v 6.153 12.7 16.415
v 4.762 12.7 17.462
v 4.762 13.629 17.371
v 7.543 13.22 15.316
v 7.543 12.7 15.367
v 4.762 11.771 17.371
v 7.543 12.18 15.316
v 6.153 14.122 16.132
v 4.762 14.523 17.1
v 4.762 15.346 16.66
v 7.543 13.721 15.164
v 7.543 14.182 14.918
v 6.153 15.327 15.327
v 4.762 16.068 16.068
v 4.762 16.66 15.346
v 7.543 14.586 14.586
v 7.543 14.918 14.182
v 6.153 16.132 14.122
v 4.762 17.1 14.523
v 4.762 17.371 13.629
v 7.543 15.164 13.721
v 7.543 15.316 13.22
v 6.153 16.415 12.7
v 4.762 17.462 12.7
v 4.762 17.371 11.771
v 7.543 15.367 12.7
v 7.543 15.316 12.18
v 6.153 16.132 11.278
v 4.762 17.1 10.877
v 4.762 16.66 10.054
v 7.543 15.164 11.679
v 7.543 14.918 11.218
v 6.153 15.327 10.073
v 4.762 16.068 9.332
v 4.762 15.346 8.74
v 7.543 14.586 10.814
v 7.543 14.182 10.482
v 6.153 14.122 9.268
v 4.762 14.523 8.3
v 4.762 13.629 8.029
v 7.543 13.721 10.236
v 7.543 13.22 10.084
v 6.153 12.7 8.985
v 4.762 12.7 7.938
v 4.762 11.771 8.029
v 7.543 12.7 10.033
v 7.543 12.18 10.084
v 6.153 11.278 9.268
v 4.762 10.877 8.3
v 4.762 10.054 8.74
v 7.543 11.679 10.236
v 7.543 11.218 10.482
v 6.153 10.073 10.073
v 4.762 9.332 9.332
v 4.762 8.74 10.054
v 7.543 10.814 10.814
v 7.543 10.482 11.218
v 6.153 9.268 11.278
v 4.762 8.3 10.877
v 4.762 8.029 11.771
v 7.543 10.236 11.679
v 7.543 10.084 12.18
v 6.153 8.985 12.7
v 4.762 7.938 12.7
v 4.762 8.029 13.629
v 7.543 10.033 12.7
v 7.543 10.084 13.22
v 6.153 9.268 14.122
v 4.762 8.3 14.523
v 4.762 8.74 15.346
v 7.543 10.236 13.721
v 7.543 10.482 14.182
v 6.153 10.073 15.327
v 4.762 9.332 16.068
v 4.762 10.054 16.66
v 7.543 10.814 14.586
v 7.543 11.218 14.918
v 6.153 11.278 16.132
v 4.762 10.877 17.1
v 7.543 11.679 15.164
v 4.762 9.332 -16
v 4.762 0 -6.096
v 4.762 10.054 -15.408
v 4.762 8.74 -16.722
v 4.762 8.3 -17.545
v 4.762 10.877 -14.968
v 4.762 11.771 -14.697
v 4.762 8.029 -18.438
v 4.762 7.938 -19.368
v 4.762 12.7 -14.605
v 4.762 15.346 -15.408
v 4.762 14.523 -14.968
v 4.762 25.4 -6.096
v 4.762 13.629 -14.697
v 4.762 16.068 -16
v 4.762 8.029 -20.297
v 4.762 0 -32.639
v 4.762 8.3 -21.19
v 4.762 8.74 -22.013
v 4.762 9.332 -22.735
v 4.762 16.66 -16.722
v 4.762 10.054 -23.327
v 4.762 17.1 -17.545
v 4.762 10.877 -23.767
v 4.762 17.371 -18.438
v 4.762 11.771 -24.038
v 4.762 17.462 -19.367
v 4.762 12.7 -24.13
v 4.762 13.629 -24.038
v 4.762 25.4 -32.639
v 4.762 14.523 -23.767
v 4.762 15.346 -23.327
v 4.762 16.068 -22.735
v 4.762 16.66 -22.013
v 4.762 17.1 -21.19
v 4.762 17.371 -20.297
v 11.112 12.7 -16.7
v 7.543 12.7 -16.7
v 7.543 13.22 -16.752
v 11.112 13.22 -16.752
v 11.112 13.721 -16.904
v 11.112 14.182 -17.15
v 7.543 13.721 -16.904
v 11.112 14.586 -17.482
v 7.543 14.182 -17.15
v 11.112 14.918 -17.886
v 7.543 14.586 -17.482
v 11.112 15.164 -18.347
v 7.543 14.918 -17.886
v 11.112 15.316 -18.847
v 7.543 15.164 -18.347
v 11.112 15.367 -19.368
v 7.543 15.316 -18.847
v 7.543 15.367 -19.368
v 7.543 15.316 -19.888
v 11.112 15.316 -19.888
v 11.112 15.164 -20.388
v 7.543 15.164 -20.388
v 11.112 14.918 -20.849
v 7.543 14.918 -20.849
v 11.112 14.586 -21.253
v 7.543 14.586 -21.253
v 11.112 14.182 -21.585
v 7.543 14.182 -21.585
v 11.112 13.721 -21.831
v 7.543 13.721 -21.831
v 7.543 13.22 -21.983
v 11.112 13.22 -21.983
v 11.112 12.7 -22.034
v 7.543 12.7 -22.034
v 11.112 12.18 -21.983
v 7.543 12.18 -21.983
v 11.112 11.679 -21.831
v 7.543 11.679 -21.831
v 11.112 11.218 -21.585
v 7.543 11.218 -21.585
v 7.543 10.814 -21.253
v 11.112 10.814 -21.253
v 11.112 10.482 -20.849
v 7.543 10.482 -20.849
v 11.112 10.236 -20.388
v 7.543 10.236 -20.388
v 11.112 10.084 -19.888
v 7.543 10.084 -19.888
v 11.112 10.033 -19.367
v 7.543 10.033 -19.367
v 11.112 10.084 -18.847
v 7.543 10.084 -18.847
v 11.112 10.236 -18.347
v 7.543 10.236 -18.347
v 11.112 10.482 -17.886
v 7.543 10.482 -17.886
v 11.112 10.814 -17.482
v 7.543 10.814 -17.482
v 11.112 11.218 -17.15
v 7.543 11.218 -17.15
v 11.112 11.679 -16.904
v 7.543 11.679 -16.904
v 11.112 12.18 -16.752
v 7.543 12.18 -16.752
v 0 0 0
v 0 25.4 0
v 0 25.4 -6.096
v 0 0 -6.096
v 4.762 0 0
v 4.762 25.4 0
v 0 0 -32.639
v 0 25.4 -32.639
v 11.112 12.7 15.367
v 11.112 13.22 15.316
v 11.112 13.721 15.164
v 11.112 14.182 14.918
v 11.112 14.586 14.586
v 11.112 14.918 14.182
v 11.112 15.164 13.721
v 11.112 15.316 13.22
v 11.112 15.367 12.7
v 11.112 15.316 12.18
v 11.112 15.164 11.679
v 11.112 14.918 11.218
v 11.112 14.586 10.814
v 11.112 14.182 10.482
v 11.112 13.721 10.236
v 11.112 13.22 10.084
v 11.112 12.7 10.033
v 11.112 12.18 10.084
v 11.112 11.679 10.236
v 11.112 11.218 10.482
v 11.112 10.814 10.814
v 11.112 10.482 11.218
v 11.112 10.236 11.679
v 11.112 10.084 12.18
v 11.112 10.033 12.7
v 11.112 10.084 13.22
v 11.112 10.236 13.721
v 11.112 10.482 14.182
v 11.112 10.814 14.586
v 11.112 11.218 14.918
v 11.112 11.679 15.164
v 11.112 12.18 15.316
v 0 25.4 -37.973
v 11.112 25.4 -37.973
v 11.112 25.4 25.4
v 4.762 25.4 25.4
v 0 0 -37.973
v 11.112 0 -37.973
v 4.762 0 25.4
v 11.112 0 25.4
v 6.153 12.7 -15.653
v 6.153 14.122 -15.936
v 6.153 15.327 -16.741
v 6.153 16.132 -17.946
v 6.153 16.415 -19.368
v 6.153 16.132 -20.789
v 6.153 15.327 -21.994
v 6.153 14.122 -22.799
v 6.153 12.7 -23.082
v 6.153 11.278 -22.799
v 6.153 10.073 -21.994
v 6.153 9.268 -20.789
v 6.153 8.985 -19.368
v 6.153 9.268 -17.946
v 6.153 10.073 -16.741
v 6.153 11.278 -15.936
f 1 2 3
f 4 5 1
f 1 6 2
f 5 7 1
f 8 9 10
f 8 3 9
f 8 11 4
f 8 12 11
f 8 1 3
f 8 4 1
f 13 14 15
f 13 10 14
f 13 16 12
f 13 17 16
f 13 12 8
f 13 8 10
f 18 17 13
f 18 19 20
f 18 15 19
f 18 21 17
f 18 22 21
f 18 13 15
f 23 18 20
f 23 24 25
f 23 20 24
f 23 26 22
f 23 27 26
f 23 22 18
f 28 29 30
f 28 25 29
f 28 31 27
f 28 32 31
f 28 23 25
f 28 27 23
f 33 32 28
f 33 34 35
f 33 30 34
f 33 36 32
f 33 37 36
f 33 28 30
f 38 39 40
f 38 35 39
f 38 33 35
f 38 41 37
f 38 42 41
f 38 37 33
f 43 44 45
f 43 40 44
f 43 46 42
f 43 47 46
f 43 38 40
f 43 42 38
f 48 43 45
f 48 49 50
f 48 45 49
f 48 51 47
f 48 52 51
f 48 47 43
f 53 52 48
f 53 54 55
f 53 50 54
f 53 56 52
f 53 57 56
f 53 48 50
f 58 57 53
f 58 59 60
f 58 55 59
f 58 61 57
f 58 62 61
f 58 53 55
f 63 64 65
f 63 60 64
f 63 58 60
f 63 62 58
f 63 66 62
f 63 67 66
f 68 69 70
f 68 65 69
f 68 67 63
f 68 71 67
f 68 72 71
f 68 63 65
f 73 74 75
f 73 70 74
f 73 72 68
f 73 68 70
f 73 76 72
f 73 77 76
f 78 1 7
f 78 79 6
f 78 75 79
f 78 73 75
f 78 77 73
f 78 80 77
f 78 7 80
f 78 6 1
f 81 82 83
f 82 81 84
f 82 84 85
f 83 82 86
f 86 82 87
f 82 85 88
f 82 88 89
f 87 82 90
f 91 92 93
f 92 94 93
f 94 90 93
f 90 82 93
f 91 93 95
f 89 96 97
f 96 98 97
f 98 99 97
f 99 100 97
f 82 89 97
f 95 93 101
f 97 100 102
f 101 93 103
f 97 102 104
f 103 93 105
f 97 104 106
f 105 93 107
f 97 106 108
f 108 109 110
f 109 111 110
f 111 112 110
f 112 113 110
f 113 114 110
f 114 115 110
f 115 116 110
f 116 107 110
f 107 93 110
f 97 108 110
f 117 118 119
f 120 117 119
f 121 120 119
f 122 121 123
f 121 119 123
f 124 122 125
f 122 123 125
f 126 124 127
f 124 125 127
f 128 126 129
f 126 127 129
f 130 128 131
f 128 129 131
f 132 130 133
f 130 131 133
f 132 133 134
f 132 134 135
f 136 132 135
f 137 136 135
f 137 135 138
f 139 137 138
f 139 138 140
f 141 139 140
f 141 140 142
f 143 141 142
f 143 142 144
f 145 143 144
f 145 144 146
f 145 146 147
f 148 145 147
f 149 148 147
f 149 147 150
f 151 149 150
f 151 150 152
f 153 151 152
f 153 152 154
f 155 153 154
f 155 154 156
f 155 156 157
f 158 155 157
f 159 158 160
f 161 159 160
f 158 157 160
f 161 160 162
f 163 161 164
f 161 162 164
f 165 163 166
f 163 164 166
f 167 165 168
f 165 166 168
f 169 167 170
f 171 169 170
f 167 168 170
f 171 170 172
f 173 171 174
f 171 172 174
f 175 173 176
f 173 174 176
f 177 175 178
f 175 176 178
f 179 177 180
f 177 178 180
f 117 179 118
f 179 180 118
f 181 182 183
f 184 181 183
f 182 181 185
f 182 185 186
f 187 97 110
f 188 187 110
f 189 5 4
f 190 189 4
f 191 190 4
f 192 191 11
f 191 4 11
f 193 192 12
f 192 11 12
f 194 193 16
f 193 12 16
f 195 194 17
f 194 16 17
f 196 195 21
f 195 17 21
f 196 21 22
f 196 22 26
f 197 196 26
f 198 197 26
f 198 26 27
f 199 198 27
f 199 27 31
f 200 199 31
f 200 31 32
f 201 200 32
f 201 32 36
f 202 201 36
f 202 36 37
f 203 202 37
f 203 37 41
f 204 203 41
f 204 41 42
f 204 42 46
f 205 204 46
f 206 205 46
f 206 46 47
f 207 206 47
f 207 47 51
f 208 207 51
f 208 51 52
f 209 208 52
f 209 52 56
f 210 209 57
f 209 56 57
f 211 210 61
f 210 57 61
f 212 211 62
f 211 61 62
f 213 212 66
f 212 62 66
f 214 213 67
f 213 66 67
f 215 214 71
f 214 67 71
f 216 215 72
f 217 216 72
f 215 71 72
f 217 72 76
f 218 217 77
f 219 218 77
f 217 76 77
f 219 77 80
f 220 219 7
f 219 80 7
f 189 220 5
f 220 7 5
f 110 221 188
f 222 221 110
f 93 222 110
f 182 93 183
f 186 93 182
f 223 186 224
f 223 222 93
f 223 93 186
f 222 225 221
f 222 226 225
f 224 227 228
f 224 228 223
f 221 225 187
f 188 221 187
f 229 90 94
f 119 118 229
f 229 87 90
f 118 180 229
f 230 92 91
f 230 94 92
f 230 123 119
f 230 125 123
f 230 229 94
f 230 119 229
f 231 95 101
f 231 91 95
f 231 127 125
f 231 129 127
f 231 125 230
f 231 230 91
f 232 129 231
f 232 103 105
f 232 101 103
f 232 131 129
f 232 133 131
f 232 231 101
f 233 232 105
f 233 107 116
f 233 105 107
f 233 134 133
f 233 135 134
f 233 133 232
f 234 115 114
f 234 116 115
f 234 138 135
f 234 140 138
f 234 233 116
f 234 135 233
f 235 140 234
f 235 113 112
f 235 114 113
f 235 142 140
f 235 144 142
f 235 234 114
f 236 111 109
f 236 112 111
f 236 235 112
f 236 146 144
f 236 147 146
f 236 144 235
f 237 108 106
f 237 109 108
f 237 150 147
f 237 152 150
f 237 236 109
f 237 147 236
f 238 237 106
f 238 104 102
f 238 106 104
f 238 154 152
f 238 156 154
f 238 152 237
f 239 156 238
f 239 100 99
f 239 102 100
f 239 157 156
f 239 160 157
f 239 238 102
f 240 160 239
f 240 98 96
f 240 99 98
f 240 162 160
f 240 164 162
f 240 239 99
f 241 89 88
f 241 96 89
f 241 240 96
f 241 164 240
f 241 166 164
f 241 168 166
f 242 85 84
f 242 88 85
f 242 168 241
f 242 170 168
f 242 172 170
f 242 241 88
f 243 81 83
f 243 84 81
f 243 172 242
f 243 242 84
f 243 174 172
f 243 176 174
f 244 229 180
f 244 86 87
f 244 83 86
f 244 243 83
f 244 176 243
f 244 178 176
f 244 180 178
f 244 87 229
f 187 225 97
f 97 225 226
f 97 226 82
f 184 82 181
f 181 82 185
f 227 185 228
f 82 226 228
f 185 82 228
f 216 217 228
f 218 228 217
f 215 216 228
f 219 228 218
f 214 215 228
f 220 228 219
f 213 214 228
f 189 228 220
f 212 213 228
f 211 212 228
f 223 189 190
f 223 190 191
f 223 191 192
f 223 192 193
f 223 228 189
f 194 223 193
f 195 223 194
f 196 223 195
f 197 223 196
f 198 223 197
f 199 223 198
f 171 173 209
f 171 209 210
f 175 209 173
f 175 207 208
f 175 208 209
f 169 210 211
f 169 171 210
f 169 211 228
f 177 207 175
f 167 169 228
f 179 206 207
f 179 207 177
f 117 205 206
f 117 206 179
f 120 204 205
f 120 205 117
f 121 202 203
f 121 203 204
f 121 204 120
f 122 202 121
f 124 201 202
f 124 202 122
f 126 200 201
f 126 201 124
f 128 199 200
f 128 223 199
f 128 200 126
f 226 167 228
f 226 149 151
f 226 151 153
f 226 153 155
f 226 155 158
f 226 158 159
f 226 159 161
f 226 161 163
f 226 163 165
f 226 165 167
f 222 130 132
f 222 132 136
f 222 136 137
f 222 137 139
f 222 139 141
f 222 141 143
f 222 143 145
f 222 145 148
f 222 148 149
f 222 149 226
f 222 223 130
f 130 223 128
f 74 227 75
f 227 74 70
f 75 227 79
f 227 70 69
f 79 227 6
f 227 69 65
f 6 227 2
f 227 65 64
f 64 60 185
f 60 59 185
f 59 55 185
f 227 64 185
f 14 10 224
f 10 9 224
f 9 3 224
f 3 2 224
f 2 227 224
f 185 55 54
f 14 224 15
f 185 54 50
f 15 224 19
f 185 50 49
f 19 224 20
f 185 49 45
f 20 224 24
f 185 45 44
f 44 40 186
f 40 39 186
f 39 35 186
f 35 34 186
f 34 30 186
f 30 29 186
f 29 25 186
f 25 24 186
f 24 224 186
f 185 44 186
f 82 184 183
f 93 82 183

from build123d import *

# Parameters (mm, degrees)
SKETCH1_W           = 6.096
SKETCH1_H           = 25.4
BOSS_EXTRUDE1_DEPTH = 4.7625
SKETCH2_W           = 69.85
SKETCH2_H           = 25.4
BOSS_EXTRUDE2_DEPTH = 6.35
SKETCH5_W           = 5.334
SKETCH5_H           = 25.4
BOSS_EXTRUDE3_DEPTH = 4.7625
CUT_EXTRUDE3_REACH  = 8.35
SKETCH6_W           = 6.477
SKETCH6_H           = 25.4
CUT_EXTRUDE1_REACH  = 8.35
SKETCH3_R           = 2.667
SKETCH4_R           = 4.7625
CUT_EXTRUDE2_DEPTH  = 3.81
CUT_EXTRUDE2_TAPER  = 37


with BuildPart() as part:
    # Sketch1 → Boss-Extrude1 (new body)
    with BuildSketch(Plane(origin=(0, 0, 0), x_dir=(0, 0, -1), z_dir=(1, 0, 0))):
        with Locations((3.048, 12.7)):
            Rectangle(SKETCH1_W, SKETCH1_H)
    extrude(amount=BOSS_EXTRUDE1_DEPTH)

    # Sketch2 → Boss-Extrude2 (add)
    with BuildSketch(Plane(origin=(4.7625, 0, 0), x_dir=(0, 0, -1), z_dir=(1, 0, 0))):
        with Locations((3.048, 12.7)):
            Rectangle(SKETCH2_W, SKETCH2_H)
    extrude(amount=BOSS_EXTRUDE2_DEPTH)

    # Sketch5 → Boss-Extrude3 (add)
    with BuildSketch(Plane.ZY.offset(-4.7625)):
        with Locations((-35.306, 12.7)):
            Rectangle(SKETCH5_W, SKETCH5_H)
    extrude(amount=BOSS_EXTRUDE3_DEPTH)

    # Sketch6 → Cut-Extrude3 (cut, up to next)
    with BuildSketch(Plane.ZY.offset(-4.7625), mode=Mode.PRIVATE) as cut_extrude3_sk1:
        with Locations((28.6385, 12.7)):
            Rectangle(SKETCH6_W, SKETCH6_H)
    cut_extrude3_tool1 = extrude(cut_extrude3_sk1.sketch, amount=-CUT_EXTRUDE3_REACH, mode=Mode.PRIVATE) & part.part
    add(cut_extrude3_tool1.solids().sort_by_distance((4.7625, 12.7, 28.6385))[0], mode=Mode.SUBTRACT)

    # Sketch3 → Cut-Extrude1 (cut, up to next)
    with BuildSketch(Plane.ZY.offset(-4.7625), mode=Mode.PRIVATE) as cut_extrude1_sk1:
        with Locations((-19.3675, 12.7)):
            Circle(SKETCH3_R)
    cut_extrude1_tool1 = extrude(cut_extrude1_sk1.sketch, amount=-CUT_EXTRUDE1_REACH, mode=Mode.PRIVATE) & part.part
    add(cut_extrude1_tool1.solids().sort_by_distance((4.7625, 12.7, -19.3675))[0], mode=Mode.SUBTRACT)
    # Sketch3 → Cut-Extrude1 (cut, up to next)
    with BuildSketch(Plane.ZY.offset(-4.7625), mode=Mode.PRIVATE) as cut_extrude1_sk2:
        with Locations((12.7, 12.7)):
            Circle(SKETCH3_R)
    cut_extrude1_tool2 = extrude(cut_extrude1_sk2.sketch, amount=-CUT_EXTRUDE1_REACH, mode=Mode.PRIVATE) & part.part
    add(cut_extrude1_tool2.solids().sort_by_distance((4.7625, 12.7, 12.7))[0], mode=Mode.SUBTRACT)

    # Sketch4 → Cut-Extrude2 (cut)
    with BuildSketch(Plane.ZY.offset(-4.7625)):
        with Locations((12.7, 12.7)):
            Circle(SKETCH4_R)
        with Locations((-19.3675, 12.7)):
            Circle(SKETCH4_R)
    extrude(amount=-CUT_EXTRUDE2_DEPTH, taper=CUT_EXTRUDE2_TAPER, mode=Mode.SUBTRACT)


solid = part.part
